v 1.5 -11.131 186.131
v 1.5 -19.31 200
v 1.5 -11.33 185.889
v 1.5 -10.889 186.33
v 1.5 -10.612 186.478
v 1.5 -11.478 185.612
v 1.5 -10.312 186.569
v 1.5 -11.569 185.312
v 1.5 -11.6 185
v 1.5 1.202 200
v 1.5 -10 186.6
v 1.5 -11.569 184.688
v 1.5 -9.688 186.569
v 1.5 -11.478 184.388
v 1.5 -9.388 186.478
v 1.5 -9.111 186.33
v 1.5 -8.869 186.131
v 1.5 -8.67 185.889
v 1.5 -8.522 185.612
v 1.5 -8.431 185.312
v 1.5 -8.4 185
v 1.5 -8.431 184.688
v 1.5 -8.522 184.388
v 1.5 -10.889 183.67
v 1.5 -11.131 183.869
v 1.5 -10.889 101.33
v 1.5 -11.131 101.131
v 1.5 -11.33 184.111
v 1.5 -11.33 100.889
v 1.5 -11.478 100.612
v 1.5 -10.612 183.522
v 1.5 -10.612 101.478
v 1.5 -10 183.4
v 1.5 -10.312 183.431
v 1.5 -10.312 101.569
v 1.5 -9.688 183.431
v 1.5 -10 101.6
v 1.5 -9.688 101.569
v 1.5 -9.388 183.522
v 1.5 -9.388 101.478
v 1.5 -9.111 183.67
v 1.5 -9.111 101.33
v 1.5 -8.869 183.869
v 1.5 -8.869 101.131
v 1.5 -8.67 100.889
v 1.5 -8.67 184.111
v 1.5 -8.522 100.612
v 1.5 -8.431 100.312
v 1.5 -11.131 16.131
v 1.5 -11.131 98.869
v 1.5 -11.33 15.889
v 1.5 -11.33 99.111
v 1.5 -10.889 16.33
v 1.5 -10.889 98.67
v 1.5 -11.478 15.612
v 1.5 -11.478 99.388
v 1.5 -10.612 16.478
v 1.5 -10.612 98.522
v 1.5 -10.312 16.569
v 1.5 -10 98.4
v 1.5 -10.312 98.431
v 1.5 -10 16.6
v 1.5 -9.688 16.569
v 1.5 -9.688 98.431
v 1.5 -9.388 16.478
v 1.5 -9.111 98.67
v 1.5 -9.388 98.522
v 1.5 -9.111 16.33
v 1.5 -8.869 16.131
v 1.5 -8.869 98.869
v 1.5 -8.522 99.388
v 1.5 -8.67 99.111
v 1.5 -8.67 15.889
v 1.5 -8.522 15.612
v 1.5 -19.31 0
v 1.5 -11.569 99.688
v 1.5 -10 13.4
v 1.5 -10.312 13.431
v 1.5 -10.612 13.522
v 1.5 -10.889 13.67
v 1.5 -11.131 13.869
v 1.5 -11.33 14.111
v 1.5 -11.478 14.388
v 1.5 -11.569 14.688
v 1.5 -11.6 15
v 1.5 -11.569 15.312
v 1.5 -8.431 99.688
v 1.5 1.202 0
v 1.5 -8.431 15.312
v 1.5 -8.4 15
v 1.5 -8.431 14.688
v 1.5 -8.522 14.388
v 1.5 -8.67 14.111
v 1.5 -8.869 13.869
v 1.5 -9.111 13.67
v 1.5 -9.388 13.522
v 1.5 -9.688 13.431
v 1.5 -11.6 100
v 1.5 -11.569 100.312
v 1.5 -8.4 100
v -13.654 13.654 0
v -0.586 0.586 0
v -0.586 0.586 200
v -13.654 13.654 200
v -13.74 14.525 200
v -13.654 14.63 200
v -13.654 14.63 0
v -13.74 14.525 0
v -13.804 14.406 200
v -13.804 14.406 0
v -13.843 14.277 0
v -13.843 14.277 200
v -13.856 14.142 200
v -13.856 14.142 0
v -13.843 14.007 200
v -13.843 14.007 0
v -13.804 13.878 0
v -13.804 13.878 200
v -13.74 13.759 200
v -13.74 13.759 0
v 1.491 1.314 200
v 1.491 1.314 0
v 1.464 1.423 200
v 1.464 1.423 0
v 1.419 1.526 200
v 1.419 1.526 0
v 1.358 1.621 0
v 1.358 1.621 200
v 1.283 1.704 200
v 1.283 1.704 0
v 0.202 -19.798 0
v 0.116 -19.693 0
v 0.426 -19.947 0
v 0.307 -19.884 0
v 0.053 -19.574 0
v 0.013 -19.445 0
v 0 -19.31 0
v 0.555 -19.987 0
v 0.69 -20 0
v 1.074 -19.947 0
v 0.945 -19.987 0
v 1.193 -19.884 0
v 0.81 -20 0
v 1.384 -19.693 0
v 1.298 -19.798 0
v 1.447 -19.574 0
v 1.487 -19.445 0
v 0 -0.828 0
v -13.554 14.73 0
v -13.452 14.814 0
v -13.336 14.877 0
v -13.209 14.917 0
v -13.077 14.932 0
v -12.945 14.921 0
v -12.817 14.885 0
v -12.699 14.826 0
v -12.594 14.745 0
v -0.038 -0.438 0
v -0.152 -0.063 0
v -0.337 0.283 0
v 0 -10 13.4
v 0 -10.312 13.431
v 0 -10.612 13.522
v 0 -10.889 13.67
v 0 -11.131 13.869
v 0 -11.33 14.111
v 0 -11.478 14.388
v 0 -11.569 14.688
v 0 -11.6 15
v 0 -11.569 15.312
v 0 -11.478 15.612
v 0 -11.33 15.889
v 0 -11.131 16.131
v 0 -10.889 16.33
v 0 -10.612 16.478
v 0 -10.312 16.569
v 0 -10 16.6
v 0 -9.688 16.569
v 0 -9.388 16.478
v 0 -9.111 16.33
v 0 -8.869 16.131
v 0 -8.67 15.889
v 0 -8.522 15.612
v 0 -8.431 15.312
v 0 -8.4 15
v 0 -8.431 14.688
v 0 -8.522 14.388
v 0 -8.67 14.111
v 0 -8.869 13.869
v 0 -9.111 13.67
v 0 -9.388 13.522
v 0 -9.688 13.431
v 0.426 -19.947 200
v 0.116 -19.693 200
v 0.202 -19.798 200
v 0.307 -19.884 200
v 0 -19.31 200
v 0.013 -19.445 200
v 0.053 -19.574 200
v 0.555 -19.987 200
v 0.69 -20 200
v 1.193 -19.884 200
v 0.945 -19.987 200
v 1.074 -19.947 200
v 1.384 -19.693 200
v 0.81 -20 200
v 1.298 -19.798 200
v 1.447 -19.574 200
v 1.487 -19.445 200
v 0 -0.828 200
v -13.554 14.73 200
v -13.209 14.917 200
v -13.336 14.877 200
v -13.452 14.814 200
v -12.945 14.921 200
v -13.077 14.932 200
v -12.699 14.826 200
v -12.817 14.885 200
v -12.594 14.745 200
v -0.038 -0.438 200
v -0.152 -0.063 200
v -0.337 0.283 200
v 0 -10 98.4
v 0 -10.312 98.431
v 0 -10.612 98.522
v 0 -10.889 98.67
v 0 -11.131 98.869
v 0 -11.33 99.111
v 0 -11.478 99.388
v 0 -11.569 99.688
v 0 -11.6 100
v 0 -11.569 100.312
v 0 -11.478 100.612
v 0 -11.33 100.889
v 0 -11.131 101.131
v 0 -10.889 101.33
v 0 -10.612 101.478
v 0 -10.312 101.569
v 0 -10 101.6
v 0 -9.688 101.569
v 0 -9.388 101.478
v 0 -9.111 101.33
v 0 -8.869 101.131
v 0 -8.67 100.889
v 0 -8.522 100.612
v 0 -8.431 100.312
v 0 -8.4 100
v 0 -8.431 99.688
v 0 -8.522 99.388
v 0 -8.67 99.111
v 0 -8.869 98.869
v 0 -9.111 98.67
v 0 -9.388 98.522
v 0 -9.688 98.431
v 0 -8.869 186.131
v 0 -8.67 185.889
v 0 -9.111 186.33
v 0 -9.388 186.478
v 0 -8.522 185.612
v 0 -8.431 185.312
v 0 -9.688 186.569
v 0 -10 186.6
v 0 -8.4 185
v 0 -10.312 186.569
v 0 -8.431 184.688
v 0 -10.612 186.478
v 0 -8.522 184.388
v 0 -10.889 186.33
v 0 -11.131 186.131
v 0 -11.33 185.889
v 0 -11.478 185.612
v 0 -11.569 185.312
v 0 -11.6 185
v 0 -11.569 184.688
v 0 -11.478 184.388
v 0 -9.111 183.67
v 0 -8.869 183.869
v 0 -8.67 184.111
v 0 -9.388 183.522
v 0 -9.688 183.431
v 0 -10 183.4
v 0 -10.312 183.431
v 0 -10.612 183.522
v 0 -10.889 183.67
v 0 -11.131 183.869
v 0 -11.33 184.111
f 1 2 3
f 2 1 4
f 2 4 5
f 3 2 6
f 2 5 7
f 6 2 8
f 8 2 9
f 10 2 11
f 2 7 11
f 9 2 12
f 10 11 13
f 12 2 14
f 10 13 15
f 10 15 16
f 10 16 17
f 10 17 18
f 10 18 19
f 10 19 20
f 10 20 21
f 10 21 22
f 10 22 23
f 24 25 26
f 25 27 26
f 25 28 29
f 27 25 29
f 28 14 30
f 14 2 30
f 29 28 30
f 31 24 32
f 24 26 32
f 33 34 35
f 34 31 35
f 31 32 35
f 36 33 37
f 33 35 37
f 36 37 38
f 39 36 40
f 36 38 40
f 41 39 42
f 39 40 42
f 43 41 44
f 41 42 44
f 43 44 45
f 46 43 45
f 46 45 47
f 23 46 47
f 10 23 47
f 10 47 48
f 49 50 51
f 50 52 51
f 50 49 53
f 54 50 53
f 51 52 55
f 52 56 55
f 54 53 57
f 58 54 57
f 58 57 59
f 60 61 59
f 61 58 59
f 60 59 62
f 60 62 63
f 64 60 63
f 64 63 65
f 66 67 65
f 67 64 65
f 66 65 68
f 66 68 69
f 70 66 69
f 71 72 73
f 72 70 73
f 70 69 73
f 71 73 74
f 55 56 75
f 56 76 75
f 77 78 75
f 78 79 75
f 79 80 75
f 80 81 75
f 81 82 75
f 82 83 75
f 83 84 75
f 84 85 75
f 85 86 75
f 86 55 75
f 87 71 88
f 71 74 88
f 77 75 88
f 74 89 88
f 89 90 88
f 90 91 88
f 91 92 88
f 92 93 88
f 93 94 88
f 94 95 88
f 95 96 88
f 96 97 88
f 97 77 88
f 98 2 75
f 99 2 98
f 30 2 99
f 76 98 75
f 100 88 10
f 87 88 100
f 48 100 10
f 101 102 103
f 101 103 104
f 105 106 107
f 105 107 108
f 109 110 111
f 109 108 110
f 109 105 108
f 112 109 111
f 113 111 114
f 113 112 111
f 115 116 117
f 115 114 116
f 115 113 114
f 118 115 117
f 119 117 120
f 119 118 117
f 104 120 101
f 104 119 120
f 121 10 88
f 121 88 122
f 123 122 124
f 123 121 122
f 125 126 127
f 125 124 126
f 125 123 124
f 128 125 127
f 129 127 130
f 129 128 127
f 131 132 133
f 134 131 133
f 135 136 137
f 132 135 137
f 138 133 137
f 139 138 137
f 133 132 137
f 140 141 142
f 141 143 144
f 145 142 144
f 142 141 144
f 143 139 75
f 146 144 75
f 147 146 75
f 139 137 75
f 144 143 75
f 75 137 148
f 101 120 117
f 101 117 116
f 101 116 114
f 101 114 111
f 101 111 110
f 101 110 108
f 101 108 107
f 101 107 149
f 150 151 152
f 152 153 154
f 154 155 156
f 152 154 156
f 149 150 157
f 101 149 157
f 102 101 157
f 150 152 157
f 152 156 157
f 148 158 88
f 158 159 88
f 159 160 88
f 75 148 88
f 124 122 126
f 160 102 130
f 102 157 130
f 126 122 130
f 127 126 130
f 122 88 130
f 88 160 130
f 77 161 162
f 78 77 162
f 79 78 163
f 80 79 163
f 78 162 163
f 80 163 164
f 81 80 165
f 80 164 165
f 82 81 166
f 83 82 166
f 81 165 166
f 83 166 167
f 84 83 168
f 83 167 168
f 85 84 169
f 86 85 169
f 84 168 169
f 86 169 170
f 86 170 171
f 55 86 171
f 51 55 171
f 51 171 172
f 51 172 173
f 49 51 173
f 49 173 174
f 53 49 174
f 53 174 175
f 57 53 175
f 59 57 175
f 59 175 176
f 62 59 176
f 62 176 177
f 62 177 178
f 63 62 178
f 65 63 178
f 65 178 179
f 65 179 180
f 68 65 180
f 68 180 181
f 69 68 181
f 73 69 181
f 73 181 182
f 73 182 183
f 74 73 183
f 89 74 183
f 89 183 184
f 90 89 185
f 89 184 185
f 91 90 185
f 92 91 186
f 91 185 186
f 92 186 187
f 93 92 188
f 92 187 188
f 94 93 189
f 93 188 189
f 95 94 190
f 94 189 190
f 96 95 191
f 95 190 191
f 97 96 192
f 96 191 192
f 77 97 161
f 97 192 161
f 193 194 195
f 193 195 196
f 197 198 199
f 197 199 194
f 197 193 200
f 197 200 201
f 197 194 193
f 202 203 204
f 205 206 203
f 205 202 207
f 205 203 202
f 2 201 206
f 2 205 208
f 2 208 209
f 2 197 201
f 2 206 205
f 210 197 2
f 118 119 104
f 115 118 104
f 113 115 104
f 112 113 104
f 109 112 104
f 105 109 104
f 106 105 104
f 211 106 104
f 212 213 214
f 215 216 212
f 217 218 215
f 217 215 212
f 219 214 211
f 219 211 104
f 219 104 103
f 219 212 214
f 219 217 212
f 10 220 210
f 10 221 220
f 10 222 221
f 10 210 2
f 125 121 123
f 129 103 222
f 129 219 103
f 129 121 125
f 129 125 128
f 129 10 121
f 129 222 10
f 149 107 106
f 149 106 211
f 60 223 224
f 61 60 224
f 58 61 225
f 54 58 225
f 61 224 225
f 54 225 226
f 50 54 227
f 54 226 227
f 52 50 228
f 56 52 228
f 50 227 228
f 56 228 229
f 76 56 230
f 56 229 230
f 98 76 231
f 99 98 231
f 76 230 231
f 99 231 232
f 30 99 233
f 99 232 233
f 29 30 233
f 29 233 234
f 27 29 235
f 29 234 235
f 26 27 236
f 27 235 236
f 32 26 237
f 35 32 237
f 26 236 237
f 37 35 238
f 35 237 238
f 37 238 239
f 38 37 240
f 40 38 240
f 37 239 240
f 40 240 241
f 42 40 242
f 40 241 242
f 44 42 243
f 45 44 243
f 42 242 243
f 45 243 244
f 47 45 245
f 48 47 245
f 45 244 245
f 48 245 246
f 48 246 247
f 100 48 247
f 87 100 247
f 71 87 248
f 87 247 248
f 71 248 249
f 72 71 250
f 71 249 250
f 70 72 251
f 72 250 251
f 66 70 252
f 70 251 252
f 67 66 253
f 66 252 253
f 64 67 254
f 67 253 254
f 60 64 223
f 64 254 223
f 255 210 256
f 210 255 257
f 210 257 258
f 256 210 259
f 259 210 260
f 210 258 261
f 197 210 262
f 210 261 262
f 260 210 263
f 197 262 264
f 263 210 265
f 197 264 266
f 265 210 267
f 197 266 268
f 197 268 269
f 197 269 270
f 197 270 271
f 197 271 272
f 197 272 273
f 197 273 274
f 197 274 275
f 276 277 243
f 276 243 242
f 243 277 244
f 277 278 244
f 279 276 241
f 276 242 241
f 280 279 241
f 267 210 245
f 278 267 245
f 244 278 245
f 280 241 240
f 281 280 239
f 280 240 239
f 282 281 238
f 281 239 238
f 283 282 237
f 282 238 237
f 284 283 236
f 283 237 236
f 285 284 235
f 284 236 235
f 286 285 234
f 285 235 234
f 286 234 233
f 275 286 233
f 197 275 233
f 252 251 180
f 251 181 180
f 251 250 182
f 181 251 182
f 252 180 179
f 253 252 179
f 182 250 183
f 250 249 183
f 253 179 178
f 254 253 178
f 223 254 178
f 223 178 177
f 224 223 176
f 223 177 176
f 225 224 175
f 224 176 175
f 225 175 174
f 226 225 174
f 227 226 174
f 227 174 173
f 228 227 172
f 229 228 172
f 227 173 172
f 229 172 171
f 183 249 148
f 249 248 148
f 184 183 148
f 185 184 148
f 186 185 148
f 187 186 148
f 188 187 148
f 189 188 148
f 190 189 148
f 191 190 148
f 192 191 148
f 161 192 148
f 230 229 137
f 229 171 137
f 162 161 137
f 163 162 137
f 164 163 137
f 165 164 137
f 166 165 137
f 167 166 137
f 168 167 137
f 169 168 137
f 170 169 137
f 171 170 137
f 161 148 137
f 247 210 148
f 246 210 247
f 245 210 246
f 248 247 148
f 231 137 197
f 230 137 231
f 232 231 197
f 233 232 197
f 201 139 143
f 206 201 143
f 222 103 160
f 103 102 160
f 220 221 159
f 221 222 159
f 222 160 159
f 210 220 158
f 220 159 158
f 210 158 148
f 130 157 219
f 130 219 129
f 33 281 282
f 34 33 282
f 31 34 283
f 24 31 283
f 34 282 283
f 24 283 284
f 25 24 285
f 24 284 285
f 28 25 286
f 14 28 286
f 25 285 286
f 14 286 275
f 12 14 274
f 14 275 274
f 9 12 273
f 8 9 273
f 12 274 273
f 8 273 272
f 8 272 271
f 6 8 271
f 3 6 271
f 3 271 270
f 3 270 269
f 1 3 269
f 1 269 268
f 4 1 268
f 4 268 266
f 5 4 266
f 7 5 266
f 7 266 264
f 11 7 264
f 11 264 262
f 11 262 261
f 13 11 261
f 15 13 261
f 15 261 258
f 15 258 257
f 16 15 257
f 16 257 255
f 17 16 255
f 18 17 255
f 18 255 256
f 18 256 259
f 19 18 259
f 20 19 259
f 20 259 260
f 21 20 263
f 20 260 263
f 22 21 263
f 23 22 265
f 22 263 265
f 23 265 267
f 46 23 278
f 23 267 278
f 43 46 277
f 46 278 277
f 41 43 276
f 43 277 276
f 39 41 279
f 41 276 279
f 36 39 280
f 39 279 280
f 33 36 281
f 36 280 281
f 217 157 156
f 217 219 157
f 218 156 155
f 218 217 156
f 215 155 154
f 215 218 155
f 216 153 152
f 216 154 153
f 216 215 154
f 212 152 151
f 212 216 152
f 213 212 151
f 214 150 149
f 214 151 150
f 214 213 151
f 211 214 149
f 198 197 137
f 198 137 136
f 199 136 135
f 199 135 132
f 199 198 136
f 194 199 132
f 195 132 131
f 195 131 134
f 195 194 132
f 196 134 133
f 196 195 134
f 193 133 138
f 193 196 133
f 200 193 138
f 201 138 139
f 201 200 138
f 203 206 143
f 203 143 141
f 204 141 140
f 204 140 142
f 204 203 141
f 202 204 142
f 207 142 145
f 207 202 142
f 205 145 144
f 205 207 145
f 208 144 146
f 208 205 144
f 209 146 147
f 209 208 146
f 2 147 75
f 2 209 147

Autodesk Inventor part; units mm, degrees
ref_plane "YZ Plane" through (0, 0, 0) normal (1, 0, 0) x (0, 1, 0)
ref_plane "XZ Plane" through (0, 0, 0) normal (0, 1, 0) x (-1, 0, 0)
ref_plane "XY Plane" through (0, 0, 0) normal (0, 0, 1) x (1, 0, 0)
sketch "Skizze1" plane through (0, 0, 0) normal (0, 0, 1) x (1, 0, 0)
  line L0 (0, -0.8284) -> (0, -20)
  line L1 (0, 0) -> (19.1716, 0) construction
  line L2 (0, -20) -> (1.5, -20)
  line L3 (1.5, -20) -> (1.5, 1.5)
  line L4 (-0.5858, 0.5858) -> (-14.1421, 14.1421)
  line L5 (-14.1421, 14.1421) -> (-13.0815, 15.2028)
  line L6 (-13.0815, 15.2028) -> (1.5, 1.5)
  arc A0 (0, -0.8284) -> (-0.5858, 0.5858) centre (-2, -0.8284) ccw
  dimension "d0" = 20
  dimension "d1" = 90
  dimension "d2" = 1.5
  dimension "d3" = 90
  dimension "d4" = 21.5
  dimension "d5" = 20
  dimension "d6" = 135
  dimension "d7" = 2
extrude "Extrusion1" add sketch "Skizze1" along normal blind 200
hole "Bohrung1" at (1.5, -10, 185) direction (-1, 0, 0) diameter 3.2 end through all
pattern_linear "Rechteckige Anordnung1" count 3 spacing 85 along (0, 0, -1) of "Bohrung1"
fillet "Rundung1" radius 0.69 5 edges at (1.5, -20, 100) (0, -20, 100) (-14.1421, 14.1421, 100) (1.5, 1.5, 100) (-13.0815, 15.2028, 100)
properties part number "LED strip mount" material "ABS-Kunststoff"
